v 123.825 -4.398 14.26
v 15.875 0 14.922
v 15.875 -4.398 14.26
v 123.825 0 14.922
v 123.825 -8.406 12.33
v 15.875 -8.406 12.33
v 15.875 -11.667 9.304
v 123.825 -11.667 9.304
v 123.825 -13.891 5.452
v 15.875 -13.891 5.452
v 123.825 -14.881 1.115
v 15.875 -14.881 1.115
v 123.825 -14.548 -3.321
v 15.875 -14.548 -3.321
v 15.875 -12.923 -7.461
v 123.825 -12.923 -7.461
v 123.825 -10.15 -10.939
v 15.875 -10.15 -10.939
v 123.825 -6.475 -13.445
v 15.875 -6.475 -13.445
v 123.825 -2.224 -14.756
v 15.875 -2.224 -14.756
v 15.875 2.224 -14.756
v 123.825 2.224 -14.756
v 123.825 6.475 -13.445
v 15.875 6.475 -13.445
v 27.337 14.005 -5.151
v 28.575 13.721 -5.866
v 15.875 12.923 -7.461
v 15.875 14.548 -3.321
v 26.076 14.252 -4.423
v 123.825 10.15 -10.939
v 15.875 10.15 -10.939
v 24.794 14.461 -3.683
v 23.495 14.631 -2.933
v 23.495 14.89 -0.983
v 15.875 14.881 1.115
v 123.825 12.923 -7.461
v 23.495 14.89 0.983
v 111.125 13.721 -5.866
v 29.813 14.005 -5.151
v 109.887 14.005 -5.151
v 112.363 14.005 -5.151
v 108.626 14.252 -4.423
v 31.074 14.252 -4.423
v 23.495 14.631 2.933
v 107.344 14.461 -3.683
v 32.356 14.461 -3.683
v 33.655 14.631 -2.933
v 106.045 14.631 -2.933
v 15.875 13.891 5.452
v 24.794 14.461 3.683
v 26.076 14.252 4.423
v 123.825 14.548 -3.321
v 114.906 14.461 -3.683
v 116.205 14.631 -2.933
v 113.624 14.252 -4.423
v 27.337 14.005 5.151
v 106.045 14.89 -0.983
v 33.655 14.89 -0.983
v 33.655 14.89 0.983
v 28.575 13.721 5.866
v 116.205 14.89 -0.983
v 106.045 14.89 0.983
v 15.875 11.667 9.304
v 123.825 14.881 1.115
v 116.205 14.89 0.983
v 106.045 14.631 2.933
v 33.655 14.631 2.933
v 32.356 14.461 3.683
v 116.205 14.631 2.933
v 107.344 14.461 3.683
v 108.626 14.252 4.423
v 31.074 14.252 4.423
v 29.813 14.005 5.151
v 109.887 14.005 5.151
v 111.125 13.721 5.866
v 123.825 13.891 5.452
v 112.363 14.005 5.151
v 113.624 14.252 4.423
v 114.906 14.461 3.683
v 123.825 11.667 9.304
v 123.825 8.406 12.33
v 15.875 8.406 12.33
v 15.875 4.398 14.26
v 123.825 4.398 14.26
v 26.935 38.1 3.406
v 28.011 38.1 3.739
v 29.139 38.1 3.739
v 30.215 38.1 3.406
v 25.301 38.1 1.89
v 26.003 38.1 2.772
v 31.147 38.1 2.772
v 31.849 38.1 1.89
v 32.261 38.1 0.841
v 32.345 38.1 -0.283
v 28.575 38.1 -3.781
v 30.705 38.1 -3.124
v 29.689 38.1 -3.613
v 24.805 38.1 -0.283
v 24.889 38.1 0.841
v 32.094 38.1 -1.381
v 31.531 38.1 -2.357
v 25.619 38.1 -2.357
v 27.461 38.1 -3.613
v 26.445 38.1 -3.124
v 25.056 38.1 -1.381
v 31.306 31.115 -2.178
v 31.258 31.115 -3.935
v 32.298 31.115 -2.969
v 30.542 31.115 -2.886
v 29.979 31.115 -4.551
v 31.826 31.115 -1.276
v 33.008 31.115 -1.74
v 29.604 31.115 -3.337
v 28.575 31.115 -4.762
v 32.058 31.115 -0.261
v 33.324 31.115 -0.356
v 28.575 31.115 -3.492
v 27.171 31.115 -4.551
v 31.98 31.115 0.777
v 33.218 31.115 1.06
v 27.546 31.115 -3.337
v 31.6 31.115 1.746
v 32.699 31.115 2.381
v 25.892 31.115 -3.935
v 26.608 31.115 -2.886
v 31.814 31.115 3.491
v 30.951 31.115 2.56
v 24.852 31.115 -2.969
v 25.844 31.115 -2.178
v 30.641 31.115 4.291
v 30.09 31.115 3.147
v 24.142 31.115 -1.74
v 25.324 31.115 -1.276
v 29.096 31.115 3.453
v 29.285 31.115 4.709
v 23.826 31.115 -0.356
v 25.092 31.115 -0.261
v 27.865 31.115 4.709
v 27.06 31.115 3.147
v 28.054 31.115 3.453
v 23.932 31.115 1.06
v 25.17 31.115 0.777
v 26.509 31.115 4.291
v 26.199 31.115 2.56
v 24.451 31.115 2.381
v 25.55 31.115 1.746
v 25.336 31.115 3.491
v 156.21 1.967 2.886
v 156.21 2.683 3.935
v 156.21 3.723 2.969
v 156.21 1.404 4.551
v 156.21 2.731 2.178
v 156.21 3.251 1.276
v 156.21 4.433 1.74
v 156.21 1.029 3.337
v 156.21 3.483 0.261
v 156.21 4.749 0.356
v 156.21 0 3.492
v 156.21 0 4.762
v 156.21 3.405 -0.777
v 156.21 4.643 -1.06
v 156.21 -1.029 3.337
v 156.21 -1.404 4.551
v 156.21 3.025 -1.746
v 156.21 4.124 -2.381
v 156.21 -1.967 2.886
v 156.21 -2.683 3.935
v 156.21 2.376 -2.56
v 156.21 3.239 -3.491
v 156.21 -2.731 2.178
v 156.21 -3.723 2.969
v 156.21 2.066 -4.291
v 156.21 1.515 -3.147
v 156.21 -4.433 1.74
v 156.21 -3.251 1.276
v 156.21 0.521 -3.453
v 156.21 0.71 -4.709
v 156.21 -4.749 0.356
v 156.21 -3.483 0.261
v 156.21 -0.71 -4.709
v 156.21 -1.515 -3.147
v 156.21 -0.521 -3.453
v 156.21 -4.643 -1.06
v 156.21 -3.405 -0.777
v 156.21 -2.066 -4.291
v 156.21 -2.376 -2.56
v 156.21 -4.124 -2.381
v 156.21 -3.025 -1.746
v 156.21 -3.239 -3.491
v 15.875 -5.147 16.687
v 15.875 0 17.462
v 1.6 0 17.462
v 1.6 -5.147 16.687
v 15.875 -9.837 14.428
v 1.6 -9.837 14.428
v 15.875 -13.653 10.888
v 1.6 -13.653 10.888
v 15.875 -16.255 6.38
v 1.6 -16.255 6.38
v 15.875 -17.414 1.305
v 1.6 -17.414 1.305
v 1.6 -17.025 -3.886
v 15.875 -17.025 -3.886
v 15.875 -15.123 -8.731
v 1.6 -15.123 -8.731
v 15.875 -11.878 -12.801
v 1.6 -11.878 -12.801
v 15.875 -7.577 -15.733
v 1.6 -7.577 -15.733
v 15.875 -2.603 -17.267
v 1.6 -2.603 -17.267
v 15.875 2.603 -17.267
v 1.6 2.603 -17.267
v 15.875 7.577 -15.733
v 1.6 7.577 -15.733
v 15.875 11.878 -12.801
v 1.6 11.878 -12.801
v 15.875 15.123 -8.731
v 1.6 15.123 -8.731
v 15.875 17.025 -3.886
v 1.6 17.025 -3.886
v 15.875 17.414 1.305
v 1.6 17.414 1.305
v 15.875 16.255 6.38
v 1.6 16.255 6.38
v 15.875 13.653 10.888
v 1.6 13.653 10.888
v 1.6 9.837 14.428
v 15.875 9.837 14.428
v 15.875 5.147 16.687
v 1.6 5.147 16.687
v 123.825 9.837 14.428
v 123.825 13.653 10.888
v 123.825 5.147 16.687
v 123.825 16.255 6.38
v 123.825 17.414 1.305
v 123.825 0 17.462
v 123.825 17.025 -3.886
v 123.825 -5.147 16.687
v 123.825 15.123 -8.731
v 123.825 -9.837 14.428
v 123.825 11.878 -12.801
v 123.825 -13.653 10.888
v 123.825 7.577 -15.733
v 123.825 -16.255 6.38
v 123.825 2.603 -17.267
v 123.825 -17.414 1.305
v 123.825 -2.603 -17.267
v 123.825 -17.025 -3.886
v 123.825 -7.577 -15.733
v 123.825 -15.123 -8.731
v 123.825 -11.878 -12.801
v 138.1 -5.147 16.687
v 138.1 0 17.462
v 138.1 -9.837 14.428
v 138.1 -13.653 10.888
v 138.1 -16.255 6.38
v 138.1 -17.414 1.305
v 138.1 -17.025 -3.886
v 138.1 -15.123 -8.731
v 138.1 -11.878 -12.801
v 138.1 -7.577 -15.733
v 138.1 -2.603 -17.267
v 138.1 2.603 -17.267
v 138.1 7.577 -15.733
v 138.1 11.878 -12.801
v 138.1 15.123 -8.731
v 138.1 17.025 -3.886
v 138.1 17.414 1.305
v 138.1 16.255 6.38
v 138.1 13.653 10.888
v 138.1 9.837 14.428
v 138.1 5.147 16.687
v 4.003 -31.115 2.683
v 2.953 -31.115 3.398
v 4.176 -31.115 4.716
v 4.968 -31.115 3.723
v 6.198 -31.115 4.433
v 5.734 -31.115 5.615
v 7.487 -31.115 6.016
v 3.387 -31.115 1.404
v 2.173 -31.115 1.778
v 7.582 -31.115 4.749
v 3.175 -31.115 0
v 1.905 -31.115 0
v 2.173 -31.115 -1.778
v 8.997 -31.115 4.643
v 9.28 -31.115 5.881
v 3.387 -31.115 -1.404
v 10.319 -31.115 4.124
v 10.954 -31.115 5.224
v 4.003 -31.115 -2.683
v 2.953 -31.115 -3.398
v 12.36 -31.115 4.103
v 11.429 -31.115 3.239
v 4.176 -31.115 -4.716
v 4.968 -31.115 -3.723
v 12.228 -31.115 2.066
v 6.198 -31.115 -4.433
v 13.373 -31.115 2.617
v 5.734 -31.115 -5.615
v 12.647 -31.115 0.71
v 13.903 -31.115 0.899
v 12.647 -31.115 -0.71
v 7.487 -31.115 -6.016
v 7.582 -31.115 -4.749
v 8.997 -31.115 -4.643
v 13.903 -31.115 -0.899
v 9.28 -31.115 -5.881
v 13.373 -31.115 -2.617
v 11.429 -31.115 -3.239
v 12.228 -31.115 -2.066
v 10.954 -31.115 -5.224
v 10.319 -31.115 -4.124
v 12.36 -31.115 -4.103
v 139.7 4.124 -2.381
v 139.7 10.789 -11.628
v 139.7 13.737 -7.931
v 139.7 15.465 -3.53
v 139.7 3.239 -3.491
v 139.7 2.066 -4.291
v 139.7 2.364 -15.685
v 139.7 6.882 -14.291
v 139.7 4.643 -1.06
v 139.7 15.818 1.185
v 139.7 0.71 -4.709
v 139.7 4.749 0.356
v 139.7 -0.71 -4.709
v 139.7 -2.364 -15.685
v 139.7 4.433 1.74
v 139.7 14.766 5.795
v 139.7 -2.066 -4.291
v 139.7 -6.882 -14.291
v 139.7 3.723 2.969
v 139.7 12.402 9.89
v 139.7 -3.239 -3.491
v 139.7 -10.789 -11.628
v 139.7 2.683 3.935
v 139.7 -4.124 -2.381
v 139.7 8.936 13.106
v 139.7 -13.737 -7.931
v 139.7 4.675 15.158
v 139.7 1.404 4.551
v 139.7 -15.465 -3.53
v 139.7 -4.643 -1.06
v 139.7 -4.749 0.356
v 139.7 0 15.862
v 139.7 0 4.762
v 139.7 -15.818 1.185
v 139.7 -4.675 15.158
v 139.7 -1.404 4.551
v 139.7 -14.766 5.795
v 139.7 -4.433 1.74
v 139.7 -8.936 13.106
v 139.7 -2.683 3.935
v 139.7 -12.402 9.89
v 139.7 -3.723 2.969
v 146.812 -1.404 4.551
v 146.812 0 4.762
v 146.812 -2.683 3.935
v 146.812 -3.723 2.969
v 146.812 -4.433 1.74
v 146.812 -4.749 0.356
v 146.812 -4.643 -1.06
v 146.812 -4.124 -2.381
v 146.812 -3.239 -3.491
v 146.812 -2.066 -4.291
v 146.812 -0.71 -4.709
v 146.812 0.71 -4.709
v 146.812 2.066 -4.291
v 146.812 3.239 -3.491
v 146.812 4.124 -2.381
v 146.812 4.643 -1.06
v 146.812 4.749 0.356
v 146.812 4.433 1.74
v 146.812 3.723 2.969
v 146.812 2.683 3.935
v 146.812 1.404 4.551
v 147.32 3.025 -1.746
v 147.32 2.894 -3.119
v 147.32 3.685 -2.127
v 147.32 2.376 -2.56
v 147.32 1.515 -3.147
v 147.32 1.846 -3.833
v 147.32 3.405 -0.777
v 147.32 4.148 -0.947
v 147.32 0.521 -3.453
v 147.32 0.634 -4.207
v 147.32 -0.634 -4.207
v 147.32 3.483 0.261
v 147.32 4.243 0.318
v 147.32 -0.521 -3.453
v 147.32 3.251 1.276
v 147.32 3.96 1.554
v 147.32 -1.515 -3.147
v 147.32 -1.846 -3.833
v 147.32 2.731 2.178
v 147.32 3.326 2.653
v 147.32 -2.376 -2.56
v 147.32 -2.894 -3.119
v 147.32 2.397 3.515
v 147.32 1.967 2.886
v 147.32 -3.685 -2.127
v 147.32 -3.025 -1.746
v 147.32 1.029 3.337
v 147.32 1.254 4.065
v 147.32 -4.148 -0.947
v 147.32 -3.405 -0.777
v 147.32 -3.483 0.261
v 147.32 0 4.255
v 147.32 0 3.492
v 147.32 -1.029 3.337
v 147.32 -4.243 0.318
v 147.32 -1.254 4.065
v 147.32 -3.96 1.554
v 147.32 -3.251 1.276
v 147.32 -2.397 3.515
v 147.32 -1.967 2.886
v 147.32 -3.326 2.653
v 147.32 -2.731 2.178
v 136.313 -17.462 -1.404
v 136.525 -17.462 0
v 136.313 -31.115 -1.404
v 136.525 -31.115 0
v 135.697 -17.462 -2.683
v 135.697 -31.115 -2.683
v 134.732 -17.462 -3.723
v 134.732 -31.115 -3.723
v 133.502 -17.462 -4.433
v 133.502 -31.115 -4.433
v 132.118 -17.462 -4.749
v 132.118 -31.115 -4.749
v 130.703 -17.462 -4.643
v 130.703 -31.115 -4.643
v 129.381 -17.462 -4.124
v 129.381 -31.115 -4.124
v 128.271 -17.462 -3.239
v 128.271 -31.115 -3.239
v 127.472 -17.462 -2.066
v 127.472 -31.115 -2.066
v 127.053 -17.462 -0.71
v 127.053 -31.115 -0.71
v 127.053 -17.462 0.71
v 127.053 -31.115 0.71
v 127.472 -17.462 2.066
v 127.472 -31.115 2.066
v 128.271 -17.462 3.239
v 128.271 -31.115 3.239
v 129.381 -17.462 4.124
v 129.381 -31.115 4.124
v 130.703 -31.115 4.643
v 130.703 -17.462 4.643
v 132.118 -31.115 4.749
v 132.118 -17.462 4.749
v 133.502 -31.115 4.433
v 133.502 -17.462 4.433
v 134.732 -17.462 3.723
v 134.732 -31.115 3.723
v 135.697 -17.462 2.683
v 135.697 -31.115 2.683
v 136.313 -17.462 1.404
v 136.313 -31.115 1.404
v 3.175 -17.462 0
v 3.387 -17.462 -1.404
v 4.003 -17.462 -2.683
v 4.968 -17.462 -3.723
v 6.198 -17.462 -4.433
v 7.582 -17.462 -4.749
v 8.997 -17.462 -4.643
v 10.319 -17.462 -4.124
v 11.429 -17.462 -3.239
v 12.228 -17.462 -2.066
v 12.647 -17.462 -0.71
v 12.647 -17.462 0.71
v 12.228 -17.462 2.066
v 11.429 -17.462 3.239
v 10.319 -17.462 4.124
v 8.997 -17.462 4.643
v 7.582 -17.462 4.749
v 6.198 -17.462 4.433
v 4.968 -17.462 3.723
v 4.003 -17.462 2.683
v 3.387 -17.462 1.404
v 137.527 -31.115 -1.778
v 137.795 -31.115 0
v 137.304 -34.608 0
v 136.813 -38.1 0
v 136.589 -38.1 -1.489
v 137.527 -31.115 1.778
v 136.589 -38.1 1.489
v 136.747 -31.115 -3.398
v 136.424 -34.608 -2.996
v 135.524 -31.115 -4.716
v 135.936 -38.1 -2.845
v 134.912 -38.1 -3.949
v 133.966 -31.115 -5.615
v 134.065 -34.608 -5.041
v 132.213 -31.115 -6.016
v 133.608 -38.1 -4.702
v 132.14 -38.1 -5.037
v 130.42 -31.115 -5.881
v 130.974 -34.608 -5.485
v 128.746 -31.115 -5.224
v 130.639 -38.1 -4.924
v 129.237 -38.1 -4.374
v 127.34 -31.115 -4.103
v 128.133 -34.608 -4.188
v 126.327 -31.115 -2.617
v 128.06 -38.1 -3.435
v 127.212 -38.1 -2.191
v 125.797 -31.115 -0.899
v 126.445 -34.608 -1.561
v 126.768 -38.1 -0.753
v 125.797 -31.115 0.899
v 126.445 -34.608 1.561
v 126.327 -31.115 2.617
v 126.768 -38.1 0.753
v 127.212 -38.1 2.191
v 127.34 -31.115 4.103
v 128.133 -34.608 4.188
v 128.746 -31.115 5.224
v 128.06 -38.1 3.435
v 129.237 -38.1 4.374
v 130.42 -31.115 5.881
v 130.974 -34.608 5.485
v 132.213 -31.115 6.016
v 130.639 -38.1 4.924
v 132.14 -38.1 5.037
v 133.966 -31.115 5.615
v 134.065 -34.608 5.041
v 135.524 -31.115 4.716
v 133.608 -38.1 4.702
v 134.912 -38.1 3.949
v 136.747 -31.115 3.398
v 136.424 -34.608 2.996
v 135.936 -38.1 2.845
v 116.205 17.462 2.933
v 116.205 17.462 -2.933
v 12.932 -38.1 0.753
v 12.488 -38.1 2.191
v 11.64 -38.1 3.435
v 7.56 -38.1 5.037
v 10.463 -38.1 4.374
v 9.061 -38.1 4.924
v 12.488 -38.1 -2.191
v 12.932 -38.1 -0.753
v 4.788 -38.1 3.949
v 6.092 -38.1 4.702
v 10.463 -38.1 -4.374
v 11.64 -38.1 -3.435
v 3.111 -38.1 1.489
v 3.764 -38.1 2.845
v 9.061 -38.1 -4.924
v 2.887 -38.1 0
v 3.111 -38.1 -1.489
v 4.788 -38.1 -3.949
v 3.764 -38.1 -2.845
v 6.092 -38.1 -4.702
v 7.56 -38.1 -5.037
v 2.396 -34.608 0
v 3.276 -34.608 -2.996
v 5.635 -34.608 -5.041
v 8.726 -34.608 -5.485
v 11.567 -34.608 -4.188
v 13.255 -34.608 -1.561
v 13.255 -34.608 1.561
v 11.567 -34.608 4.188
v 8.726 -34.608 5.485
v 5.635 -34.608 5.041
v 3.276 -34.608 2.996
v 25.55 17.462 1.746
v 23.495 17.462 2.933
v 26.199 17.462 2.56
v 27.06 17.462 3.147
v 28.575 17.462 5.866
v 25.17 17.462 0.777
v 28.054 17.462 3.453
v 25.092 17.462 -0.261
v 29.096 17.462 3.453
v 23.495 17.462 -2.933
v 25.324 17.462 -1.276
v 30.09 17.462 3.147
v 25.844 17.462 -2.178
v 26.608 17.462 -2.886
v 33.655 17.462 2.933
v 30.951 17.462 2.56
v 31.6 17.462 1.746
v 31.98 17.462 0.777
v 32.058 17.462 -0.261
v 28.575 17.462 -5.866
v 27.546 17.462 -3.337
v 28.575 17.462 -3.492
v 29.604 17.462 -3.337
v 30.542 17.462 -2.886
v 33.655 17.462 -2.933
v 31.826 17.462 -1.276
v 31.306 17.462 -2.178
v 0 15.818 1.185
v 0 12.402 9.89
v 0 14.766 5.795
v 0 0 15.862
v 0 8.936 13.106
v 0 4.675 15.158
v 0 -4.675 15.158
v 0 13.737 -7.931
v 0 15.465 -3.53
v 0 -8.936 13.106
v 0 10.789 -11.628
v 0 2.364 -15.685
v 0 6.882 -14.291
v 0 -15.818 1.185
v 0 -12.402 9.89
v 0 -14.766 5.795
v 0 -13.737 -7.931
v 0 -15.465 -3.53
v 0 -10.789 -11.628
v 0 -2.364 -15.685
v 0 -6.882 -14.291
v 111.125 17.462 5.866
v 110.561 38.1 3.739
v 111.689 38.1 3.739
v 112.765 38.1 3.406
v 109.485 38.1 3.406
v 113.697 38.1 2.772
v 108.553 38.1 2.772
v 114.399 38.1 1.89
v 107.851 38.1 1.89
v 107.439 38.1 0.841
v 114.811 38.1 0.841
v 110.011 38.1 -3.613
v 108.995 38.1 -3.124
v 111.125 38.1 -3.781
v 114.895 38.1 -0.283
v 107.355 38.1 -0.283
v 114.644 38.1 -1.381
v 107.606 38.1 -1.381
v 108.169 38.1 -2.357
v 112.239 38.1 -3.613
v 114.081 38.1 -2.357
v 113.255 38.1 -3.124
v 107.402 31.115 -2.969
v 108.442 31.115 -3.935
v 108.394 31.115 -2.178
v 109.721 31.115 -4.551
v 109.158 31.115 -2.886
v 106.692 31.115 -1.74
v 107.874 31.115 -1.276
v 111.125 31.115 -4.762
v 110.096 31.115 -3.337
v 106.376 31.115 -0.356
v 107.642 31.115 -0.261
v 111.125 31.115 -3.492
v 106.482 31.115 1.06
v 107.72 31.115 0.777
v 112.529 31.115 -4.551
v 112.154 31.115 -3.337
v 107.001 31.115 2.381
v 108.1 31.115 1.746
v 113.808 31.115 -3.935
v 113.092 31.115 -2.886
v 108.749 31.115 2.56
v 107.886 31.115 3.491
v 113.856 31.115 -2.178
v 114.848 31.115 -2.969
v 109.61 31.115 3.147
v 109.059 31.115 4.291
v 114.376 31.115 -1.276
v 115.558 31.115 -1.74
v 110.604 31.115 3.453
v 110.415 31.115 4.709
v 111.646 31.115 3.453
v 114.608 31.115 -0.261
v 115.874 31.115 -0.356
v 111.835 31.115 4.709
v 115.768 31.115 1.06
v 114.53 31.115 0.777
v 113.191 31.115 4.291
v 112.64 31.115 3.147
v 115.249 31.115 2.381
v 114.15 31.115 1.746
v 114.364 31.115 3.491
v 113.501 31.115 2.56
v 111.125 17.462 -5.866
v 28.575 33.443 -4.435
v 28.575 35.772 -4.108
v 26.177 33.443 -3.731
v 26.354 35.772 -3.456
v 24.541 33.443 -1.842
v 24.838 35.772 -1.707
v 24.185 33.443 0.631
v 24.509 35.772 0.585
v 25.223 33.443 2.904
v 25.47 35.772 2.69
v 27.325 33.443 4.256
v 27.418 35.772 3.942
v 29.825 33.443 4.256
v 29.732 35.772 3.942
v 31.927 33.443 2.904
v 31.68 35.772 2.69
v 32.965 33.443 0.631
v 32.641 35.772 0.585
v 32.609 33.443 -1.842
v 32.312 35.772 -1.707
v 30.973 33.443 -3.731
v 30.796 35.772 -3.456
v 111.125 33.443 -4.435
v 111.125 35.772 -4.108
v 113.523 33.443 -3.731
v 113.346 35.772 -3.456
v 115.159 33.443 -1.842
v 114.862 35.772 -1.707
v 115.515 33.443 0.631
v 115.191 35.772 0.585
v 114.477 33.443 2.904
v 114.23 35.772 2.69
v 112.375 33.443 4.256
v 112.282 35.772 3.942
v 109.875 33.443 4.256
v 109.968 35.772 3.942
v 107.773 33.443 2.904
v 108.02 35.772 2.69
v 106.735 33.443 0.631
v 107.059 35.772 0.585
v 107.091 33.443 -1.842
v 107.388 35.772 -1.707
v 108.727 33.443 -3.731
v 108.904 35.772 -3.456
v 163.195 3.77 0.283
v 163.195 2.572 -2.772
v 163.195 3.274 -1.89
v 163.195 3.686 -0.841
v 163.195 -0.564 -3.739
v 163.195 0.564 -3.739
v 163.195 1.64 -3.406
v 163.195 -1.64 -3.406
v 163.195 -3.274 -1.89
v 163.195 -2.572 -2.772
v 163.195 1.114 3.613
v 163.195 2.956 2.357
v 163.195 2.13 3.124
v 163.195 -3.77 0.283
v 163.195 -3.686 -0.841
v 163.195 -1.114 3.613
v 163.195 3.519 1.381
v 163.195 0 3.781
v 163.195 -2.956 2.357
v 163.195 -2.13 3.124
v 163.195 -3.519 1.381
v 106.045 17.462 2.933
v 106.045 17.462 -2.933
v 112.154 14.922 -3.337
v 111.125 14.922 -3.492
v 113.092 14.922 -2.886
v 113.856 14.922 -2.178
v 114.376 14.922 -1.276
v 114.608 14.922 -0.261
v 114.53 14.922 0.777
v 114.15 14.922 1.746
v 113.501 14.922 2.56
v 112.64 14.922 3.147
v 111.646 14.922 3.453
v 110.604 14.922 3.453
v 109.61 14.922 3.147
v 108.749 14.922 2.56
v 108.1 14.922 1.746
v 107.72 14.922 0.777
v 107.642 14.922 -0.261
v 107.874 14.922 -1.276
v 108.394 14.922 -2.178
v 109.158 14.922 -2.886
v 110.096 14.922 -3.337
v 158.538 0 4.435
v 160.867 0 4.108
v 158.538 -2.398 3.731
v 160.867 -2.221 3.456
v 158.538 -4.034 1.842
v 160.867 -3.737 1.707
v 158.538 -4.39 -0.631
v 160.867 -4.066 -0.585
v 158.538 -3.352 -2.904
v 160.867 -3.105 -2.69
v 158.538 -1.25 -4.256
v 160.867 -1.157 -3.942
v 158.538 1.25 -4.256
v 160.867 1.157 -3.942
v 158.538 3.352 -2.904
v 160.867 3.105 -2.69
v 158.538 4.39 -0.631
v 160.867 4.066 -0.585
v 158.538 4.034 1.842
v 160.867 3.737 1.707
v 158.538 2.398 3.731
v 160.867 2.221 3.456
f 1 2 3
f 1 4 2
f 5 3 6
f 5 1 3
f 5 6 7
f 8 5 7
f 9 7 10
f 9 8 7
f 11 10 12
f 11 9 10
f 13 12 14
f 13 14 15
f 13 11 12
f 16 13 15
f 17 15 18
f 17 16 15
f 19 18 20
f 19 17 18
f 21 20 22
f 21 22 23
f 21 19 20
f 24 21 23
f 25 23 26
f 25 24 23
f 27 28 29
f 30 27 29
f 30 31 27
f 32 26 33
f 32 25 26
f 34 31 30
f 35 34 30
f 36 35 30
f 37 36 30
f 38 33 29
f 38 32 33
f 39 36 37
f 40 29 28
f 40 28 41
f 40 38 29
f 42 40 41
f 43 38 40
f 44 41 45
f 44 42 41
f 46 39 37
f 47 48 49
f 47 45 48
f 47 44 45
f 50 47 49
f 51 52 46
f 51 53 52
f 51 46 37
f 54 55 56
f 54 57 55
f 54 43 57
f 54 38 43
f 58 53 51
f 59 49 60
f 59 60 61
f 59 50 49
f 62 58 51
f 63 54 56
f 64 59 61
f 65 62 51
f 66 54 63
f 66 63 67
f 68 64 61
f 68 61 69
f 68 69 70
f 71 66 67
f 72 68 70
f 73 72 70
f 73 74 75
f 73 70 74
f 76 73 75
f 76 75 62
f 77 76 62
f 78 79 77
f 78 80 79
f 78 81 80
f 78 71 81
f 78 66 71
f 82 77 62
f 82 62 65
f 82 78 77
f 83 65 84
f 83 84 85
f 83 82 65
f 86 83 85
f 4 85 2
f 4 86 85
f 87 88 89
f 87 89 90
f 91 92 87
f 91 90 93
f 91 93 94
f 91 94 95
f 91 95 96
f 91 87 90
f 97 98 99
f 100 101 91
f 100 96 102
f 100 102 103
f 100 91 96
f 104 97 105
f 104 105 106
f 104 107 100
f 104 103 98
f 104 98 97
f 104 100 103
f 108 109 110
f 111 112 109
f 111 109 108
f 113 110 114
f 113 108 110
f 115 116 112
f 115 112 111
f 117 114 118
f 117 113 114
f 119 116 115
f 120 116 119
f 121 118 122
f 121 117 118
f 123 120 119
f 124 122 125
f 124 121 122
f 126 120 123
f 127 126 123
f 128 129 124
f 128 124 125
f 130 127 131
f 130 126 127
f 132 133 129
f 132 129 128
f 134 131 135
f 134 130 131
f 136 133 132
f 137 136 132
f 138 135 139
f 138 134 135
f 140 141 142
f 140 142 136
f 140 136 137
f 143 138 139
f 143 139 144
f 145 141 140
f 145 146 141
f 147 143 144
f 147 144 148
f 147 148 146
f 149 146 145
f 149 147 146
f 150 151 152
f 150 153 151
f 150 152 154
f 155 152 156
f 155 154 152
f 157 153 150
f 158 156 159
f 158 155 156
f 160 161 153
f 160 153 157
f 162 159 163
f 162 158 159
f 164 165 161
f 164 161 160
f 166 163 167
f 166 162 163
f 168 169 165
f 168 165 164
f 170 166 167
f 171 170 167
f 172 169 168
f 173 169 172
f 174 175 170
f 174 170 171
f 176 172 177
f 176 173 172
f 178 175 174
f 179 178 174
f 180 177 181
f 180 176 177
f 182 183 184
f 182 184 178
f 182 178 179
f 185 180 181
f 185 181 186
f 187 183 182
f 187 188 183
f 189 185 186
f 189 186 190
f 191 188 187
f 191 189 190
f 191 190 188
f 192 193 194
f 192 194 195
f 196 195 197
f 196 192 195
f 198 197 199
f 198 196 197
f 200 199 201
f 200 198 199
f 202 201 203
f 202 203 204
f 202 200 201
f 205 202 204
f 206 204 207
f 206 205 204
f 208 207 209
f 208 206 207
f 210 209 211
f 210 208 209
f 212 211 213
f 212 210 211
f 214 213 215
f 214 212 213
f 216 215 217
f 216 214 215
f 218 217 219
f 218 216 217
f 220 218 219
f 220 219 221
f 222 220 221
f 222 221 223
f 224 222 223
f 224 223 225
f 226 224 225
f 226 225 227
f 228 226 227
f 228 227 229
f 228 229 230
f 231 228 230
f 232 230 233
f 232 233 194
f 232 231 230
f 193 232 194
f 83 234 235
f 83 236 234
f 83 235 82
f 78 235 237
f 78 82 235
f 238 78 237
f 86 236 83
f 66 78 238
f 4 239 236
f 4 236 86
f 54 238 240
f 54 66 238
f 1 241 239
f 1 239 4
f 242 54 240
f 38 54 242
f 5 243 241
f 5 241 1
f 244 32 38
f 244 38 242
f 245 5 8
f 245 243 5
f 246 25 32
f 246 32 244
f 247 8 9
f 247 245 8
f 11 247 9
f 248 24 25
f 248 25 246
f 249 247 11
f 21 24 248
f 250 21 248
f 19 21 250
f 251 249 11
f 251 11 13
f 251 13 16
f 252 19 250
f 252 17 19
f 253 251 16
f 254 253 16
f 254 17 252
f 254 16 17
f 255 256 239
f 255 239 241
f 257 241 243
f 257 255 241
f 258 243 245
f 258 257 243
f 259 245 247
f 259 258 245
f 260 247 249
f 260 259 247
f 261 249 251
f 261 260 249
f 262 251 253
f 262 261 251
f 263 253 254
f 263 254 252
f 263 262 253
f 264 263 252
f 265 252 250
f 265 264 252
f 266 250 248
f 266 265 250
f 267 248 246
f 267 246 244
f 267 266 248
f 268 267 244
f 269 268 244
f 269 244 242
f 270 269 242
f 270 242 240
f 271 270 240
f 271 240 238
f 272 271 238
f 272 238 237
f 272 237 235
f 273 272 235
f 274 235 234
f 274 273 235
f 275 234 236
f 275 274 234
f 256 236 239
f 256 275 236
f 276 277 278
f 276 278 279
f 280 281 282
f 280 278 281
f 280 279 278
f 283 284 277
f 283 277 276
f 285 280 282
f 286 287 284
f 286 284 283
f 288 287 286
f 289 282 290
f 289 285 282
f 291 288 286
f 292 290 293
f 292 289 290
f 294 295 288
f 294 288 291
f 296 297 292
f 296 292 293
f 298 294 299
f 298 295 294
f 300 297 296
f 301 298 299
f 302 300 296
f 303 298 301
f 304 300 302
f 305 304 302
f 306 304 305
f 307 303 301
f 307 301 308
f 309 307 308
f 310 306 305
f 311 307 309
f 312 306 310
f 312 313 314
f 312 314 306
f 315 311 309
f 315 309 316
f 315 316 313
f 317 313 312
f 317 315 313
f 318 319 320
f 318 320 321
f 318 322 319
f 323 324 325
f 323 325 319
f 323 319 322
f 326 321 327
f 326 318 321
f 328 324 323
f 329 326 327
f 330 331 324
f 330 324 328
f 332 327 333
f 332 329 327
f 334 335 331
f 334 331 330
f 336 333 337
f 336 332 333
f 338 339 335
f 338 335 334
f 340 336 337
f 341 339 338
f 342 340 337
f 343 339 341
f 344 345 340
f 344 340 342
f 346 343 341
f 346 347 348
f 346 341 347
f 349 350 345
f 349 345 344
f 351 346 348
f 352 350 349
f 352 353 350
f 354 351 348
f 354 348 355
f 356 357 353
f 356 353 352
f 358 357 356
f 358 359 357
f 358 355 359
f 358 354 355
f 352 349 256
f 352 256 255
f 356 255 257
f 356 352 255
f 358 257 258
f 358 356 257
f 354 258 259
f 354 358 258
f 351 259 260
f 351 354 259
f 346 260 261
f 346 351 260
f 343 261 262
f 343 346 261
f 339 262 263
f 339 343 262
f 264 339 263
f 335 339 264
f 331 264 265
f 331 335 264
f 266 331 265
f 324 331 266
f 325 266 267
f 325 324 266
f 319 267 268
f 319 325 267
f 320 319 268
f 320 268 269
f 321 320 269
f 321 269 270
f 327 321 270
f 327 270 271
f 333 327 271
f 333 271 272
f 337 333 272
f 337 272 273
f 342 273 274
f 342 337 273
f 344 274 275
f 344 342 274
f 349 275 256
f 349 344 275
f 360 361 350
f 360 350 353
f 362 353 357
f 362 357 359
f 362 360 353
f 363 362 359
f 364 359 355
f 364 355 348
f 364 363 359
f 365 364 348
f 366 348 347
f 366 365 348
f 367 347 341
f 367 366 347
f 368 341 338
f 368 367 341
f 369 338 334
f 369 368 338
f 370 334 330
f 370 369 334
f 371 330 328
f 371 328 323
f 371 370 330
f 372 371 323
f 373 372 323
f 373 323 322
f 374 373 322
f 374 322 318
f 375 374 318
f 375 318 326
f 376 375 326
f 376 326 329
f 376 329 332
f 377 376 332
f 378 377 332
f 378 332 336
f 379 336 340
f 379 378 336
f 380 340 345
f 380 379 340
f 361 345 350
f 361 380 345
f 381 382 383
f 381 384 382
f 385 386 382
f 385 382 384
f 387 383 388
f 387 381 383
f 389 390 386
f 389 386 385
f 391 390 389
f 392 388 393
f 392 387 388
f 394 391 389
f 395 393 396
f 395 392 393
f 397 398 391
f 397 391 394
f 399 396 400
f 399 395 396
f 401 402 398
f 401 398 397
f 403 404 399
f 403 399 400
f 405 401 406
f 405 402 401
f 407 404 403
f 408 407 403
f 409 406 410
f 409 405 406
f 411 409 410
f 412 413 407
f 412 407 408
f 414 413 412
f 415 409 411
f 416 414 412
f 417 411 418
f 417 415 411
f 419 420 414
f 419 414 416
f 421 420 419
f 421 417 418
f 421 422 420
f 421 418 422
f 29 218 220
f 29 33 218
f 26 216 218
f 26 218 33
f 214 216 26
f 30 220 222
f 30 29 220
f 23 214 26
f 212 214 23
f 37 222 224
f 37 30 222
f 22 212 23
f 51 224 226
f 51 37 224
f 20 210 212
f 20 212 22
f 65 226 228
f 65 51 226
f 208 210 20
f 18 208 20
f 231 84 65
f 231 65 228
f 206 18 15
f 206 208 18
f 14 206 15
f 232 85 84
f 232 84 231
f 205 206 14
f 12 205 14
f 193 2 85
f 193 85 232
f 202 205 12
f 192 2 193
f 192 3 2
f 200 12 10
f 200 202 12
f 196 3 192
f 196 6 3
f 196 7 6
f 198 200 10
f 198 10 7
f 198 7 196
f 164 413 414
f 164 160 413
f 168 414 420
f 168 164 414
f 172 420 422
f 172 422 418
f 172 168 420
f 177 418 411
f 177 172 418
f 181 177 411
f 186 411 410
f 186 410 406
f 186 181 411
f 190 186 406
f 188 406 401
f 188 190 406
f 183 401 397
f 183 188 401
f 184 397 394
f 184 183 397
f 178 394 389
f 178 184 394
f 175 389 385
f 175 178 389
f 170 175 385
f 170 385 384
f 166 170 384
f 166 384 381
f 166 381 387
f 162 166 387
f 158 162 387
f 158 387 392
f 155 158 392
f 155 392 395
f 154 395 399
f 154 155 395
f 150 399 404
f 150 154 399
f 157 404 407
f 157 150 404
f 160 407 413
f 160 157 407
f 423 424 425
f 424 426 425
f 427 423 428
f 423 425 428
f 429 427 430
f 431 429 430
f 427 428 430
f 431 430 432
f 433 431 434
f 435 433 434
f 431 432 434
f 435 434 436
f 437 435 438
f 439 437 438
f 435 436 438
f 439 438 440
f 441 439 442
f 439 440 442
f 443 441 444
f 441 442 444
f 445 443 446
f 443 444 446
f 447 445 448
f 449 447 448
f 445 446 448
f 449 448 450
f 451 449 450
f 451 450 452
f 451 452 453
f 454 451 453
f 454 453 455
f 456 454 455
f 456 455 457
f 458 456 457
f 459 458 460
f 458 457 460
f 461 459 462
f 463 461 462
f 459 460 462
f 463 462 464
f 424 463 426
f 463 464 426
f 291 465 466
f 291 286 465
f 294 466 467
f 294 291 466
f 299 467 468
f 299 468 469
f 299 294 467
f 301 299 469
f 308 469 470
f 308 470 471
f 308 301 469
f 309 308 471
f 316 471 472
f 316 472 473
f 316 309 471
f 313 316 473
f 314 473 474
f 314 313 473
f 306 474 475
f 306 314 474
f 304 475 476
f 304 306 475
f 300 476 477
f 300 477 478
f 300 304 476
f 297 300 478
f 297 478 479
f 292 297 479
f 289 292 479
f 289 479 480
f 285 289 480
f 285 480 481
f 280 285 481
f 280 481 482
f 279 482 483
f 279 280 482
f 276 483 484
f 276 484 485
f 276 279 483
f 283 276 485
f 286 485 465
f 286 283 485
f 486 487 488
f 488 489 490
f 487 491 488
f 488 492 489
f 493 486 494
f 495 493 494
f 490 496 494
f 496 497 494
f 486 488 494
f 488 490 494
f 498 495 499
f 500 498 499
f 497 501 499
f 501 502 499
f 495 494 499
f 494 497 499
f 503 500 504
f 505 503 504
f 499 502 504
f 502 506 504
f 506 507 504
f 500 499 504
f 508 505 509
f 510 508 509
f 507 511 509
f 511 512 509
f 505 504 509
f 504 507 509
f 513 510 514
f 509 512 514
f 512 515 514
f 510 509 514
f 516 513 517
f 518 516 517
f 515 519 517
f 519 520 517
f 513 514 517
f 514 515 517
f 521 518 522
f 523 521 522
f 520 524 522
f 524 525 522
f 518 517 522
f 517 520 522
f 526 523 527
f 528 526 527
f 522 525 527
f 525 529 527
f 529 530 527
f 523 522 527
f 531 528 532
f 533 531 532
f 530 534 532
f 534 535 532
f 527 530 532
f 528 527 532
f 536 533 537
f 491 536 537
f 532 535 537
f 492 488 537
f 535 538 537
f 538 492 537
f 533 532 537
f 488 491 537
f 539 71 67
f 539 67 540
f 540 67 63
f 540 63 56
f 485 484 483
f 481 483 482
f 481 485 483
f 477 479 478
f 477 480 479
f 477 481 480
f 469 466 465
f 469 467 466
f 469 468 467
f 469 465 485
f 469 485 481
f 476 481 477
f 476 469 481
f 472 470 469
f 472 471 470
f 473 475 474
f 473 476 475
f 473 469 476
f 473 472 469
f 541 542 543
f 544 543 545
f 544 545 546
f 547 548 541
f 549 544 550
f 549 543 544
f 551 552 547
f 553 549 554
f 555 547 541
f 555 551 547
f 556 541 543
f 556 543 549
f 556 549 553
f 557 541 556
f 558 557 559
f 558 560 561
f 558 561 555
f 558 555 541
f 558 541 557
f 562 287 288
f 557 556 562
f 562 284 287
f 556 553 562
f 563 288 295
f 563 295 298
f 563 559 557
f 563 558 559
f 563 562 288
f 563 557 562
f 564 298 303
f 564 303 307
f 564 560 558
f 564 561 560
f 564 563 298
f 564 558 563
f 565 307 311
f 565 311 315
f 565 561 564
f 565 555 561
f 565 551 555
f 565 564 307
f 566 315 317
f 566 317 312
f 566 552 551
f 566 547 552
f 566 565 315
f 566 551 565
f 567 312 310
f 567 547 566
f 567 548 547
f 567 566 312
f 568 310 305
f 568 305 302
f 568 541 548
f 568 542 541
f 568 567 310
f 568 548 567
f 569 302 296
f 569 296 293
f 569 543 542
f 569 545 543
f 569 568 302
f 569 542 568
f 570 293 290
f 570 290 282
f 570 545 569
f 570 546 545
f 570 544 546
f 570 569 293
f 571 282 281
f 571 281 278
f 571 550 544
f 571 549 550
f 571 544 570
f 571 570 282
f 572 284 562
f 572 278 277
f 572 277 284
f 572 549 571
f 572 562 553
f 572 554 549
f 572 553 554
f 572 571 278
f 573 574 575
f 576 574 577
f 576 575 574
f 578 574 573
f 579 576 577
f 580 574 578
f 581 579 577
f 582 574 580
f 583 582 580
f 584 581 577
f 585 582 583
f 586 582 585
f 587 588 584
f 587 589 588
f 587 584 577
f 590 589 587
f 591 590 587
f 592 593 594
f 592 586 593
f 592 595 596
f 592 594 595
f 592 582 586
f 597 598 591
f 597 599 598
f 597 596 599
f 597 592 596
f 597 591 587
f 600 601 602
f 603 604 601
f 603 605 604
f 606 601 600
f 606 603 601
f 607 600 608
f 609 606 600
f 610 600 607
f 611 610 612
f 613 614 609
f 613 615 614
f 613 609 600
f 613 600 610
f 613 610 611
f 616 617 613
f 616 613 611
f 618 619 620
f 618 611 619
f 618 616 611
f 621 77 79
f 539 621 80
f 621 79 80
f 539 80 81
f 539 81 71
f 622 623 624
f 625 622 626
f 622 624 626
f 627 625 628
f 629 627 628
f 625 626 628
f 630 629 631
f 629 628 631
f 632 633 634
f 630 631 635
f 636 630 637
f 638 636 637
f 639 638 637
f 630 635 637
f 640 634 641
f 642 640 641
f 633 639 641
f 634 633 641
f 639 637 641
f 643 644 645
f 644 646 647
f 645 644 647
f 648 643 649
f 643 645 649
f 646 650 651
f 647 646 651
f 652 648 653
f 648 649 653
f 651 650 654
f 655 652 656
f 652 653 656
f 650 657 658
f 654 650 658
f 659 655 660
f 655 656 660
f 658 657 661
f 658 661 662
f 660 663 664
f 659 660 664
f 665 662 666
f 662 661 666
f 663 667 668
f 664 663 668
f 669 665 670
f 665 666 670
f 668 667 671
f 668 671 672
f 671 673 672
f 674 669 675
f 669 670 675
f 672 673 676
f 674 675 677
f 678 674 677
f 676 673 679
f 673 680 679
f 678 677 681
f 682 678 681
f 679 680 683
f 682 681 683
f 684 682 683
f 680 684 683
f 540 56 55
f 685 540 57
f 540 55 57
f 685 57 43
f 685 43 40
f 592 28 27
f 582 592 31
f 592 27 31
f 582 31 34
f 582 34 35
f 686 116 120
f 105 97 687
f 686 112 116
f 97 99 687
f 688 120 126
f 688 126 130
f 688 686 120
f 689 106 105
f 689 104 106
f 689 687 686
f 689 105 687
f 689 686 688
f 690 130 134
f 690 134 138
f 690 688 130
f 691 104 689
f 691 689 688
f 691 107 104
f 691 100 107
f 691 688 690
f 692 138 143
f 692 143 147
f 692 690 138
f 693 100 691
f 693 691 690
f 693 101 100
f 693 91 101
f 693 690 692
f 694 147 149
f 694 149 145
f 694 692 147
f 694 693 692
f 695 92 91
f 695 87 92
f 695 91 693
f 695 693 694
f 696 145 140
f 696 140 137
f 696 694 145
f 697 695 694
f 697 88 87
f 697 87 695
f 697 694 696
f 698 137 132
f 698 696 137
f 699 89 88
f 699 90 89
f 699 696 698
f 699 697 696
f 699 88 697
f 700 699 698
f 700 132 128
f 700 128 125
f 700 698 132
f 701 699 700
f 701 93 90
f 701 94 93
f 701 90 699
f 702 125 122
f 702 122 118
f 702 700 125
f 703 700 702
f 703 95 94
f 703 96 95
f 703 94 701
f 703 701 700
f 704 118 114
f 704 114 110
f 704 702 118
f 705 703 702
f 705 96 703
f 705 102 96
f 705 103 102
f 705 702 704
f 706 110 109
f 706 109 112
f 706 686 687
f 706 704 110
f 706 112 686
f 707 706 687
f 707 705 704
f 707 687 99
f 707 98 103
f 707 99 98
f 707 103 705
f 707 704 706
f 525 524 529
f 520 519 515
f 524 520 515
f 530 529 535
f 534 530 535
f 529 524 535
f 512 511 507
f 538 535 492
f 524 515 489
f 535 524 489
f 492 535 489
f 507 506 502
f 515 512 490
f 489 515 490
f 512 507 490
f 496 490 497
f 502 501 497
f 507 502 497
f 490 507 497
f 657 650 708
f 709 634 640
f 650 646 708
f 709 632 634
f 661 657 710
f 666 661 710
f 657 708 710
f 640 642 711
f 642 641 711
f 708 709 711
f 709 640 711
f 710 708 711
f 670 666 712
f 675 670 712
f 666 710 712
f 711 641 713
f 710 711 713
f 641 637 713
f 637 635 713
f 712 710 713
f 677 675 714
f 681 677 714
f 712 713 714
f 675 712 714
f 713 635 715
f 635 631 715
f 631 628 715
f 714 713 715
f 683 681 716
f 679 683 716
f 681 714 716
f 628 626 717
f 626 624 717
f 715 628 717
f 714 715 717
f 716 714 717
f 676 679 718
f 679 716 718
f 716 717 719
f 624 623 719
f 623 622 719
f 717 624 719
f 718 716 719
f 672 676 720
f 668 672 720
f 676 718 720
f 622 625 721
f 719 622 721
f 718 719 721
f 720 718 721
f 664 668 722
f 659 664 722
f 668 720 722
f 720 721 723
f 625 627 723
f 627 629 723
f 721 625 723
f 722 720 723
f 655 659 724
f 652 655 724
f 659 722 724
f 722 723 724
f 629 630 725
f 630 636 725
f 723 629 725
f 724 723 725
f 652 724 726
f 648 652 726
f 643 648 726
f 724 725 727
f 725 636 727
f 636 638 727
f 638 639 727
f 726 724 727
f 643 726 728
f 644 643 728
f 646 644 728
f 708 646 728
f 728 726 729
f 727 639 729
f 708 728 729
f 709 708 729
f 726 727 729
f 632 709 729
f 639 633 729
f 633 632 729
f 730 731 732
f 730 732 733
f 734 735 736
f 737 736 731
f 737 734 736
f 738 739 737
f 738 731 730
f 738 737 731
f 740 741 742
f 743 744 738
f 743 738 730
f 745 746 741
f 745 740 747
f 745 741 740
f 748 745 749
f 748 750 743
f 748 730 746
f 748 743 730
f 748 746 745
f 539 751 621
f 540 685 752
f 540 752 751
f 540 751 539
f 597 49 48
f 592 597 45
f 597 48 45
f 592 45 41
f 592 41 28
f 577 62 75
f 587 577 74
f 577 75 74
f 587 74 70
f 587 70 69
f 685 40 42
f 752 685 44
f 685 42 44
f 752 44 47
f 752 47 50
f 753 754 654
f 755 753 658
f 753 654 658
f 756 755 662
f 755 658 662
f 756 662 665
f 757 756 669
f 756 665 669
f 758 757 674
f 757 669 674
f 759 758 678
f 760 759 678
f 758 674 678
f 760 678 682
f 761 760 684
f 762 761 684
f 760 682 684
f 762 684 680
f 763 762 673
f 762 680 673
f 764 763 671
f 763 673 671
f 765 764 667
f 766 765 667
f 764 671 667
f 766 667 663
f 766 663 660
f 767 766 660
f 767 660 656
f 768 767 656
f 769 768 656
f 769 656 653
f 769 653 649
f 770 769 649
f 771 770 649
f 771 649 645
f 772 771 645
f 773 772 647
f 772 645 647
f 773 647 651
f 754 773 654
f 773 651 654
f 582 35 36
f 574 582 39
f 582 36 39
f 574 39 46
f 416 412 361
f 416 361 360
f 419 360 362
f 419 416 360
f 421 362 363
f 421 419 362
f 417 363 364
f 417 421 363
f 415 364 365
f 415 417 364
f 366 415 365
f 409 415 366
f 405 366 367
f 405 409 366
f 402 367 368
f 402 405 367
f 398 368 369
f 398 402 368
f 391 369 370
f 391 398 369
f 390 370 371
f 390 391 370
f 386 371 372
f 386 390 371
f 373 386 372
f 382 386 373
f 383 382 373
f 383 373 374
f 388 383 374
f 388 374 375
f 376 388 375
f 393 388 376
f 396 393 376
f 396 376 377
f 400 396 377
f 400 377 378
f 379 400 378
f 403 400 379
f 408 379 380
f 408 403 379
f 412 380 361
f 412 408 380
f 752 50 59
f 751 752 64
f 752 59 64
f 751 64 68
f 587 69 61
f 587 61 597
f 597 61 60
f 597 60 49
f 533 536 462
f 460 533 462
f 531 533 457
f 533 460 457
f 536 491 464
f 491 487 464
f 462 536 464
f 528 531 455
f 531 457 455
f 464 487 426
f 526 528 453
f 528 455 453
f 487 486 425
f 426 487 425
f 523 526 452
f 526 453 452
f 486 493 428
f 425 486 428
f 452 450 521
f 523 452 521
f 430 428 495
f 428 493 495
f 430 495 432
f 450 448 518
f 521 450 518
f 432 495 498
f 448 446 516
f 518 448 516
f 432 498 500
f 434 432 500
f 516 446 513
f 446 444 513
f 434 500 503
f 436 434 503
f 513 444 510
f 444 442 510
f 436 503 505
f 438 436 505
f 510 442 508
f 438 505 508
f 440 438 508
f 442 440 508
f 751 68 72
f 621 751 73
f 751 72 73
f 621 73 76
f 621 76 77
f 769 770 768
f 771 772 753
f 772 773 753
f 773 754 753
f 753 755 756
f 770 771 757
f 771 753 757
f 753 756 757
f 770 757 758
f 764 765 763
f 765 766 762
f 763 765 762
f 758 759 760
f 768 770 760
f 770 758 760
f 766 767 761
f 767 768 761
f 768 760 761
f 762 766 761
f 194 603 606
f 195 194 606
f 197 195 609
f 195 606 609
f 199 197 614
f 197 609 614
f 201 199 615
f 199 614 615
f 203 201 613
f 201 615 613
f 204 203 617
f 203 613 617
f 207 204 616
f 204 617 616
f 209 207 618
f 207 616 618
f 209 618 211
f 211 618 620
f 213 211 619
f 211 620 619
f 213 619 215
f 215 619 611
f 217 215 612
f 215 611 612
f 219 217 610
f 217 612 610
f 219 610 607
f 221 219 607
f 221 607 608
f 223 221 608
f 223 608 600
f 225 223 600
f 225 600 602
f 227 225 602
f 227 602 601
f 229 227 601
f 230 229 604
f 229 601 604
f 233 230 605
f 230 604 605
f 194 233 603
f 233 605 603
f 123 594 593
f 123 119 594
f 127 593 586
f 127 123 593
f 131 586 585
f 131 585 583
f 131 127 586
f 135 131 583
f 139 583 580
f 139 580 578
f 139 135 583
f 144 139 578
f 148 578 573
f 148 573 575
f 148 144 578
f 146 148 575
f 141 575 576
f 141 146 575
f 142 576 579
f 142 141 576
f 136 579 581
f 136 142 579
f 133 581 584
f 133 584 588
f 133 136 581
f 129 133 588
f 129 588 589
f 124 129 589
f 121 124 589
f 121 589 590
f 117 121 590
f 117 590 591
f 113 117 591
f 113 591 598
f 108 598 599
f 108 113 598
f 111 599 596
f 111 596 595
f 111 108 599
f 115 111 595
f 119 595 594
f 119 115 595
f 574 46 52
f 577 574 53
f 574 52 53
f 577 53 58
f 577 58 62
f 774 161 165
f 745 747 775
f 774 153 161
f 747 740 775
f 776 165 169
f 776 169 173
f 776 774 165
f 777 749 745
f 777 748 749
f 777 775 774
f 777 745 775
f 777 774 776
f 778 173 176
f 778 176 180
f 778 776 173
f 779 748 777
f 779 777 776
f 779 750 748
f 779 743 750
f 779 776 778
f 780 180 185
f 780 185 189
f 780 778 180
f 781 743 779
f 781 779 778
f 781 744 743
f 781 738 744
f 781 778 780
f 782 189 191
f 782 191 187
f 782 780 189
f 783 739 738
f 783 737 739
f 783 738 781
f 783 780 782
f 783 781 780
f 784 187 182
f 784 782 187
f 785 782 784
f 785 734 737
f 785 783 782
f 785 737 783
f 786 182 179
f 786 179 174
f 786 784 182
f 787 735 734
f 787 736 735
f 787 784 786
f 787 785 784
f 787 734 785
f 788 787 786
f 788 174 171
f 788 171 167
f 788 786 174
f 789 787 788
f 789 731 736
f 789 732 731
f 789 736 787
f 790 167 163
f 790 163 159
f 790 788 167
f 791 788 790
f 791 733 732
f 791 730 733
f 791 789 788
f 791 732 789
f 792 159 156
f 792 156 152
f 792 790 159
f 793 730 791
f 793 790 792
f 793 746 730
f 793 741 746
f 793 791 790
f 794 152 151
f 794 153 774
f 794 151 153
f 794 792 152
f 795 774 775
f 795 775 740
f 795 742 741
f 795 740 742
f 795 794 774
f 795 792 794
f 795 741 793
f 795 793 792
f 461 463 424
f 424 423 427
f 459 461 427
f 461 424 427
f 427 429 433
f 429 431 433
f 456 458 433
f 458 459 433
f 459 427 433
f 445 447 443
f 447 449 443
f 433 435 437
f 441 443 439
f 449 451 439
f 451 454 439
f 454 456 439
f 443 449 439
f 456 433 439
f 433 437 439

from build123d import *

# Parameters (mm, degrees)
BOSS_EXTRUDE1_DEPTH = 17.4625
CHAMFER1_SIZE       = 1.6002
CHAMFER2_SIZE       = 0.508


with BuildPart() as part:
    # Sketch1 → Revolve1 (revolve)
    with BuildSketch(Plane.XY, mode=Mode.PRIVATE) as revolve1_sk:
        Polygon((0, 0), (0, 17.4625), (15.875, 17.4625), (15.875, 14.9225), (123.825, 14.9225), (123.825, 17.4625), (139.7, 17.4625), (139.7, 4.7625), (147.32, 4.7625), (147.32, 3.4925), (156.21, 3.4925), (156.21, 4.7625), (163.195, 3.78082227), (163.195, 0), align=None)
    revolve(revolve1_sk.sketch.rotate(Axis((0, 0, 0), (1, 0, 0)), 90), axis=Axis((0, 0, 0), (1, 0, 0)))



with BuildPart() as body_2:
    # Sketch2 → Revolve2 (revolve)
    with BuildSketch(Plane.XY, mode=Mode.PRIVATE) as revolve2_sk:
        Polygon((12.7, -17.4625), (12.7, -31.115), (13.97, -31.115), (12.98832227, -38.1), (7.9375, -38.1), (7.9375, -17.4625), align=None)
    revolve(revolve2_sk.sketch.rotate(Axis((7.9375, -0.261290097, 0), (0, -1, 0)), 180), axis=Axis((7.9375, -0.261290097, 0), (0, -1, 0)))


with BuildPart() as body_3:
    # Sketch3 → Revolve3 (revolve)
    with BuildSketch(Plane.XY, mode=Mode.PRIVATE) as revolve3_sk:
        Polygon((25.0825, 14.9225), (25.0825, 31.115), (23.8125, 31.115), (24.79417773, 38.1), (28.575, 38.1), (28.575, 14.9225), align=None)
    revolve(revolve3_sk.sketch.rotate(Axis((28.575, -0.825209821, 0), (0, 1, 0)), 270), axis=Axis((28.575, -0.825209821, 0), (0, 1, 0)))


with BuildPart() as body_4:
    # Mirror4: mirrored copy
    add(body_2.part.mirror(Plane.ZY.offset(-69.85)))


with BuildPart() as body_5:
    # Mirror4 2: mirrored copy
    add(body_3.part.mirror(Plane.ZY.offset(-69.85)))


with BuildPart() as part_1:
    add(part.part)

    add(body_3.part)  # Boss-Extrude1 merges body 3
    # Sketch4 → Boss-Extrude1 (add)
    with BuildSketch(Plane(origin=(0, 0, 0), x_dir=(1, 0, 0), z_dir=(0, 1, 0))):
        Polygon((33.655, -2.932939367), (33.655, 2.932939367), (28.575, 5.865878735), (23.495, 2.932939367), (23.495, -2.932939367), (28.575, -5.865878735), align=None)
        Polygon((111.125, -5.865878735), (116.205, -2.932939367), (116.205, 2.932939367), (111.125, 5.865878735), (106.045, 2.932939367), (106.045, -2.932939367), align=None)
    extrude(amount=BOSS_EXTRUDE1_DEPTH)

    # Chamfer1
    chamfer1_edges = [part_1.edges().sort_by_distance(p)[0] for p in [
        (139.7, 0, -17.4625),
        (0, 0, -17.4625),
    ]]
    chamfer(chamfer1_edges, length=CHAMFER1_SIZE)

    # Chamfer2
    chamfer2_edges = [part_1.edges().sort_by_distance(p)[0] for p in [
        (147.32, 0, -4.7625),
    ]]
    chamfer(chamfer2_edges, length=CHAMFER2_SIZE)


solid = Compound([body_2.part, body_4.part, body_5.part, part_1.part])
